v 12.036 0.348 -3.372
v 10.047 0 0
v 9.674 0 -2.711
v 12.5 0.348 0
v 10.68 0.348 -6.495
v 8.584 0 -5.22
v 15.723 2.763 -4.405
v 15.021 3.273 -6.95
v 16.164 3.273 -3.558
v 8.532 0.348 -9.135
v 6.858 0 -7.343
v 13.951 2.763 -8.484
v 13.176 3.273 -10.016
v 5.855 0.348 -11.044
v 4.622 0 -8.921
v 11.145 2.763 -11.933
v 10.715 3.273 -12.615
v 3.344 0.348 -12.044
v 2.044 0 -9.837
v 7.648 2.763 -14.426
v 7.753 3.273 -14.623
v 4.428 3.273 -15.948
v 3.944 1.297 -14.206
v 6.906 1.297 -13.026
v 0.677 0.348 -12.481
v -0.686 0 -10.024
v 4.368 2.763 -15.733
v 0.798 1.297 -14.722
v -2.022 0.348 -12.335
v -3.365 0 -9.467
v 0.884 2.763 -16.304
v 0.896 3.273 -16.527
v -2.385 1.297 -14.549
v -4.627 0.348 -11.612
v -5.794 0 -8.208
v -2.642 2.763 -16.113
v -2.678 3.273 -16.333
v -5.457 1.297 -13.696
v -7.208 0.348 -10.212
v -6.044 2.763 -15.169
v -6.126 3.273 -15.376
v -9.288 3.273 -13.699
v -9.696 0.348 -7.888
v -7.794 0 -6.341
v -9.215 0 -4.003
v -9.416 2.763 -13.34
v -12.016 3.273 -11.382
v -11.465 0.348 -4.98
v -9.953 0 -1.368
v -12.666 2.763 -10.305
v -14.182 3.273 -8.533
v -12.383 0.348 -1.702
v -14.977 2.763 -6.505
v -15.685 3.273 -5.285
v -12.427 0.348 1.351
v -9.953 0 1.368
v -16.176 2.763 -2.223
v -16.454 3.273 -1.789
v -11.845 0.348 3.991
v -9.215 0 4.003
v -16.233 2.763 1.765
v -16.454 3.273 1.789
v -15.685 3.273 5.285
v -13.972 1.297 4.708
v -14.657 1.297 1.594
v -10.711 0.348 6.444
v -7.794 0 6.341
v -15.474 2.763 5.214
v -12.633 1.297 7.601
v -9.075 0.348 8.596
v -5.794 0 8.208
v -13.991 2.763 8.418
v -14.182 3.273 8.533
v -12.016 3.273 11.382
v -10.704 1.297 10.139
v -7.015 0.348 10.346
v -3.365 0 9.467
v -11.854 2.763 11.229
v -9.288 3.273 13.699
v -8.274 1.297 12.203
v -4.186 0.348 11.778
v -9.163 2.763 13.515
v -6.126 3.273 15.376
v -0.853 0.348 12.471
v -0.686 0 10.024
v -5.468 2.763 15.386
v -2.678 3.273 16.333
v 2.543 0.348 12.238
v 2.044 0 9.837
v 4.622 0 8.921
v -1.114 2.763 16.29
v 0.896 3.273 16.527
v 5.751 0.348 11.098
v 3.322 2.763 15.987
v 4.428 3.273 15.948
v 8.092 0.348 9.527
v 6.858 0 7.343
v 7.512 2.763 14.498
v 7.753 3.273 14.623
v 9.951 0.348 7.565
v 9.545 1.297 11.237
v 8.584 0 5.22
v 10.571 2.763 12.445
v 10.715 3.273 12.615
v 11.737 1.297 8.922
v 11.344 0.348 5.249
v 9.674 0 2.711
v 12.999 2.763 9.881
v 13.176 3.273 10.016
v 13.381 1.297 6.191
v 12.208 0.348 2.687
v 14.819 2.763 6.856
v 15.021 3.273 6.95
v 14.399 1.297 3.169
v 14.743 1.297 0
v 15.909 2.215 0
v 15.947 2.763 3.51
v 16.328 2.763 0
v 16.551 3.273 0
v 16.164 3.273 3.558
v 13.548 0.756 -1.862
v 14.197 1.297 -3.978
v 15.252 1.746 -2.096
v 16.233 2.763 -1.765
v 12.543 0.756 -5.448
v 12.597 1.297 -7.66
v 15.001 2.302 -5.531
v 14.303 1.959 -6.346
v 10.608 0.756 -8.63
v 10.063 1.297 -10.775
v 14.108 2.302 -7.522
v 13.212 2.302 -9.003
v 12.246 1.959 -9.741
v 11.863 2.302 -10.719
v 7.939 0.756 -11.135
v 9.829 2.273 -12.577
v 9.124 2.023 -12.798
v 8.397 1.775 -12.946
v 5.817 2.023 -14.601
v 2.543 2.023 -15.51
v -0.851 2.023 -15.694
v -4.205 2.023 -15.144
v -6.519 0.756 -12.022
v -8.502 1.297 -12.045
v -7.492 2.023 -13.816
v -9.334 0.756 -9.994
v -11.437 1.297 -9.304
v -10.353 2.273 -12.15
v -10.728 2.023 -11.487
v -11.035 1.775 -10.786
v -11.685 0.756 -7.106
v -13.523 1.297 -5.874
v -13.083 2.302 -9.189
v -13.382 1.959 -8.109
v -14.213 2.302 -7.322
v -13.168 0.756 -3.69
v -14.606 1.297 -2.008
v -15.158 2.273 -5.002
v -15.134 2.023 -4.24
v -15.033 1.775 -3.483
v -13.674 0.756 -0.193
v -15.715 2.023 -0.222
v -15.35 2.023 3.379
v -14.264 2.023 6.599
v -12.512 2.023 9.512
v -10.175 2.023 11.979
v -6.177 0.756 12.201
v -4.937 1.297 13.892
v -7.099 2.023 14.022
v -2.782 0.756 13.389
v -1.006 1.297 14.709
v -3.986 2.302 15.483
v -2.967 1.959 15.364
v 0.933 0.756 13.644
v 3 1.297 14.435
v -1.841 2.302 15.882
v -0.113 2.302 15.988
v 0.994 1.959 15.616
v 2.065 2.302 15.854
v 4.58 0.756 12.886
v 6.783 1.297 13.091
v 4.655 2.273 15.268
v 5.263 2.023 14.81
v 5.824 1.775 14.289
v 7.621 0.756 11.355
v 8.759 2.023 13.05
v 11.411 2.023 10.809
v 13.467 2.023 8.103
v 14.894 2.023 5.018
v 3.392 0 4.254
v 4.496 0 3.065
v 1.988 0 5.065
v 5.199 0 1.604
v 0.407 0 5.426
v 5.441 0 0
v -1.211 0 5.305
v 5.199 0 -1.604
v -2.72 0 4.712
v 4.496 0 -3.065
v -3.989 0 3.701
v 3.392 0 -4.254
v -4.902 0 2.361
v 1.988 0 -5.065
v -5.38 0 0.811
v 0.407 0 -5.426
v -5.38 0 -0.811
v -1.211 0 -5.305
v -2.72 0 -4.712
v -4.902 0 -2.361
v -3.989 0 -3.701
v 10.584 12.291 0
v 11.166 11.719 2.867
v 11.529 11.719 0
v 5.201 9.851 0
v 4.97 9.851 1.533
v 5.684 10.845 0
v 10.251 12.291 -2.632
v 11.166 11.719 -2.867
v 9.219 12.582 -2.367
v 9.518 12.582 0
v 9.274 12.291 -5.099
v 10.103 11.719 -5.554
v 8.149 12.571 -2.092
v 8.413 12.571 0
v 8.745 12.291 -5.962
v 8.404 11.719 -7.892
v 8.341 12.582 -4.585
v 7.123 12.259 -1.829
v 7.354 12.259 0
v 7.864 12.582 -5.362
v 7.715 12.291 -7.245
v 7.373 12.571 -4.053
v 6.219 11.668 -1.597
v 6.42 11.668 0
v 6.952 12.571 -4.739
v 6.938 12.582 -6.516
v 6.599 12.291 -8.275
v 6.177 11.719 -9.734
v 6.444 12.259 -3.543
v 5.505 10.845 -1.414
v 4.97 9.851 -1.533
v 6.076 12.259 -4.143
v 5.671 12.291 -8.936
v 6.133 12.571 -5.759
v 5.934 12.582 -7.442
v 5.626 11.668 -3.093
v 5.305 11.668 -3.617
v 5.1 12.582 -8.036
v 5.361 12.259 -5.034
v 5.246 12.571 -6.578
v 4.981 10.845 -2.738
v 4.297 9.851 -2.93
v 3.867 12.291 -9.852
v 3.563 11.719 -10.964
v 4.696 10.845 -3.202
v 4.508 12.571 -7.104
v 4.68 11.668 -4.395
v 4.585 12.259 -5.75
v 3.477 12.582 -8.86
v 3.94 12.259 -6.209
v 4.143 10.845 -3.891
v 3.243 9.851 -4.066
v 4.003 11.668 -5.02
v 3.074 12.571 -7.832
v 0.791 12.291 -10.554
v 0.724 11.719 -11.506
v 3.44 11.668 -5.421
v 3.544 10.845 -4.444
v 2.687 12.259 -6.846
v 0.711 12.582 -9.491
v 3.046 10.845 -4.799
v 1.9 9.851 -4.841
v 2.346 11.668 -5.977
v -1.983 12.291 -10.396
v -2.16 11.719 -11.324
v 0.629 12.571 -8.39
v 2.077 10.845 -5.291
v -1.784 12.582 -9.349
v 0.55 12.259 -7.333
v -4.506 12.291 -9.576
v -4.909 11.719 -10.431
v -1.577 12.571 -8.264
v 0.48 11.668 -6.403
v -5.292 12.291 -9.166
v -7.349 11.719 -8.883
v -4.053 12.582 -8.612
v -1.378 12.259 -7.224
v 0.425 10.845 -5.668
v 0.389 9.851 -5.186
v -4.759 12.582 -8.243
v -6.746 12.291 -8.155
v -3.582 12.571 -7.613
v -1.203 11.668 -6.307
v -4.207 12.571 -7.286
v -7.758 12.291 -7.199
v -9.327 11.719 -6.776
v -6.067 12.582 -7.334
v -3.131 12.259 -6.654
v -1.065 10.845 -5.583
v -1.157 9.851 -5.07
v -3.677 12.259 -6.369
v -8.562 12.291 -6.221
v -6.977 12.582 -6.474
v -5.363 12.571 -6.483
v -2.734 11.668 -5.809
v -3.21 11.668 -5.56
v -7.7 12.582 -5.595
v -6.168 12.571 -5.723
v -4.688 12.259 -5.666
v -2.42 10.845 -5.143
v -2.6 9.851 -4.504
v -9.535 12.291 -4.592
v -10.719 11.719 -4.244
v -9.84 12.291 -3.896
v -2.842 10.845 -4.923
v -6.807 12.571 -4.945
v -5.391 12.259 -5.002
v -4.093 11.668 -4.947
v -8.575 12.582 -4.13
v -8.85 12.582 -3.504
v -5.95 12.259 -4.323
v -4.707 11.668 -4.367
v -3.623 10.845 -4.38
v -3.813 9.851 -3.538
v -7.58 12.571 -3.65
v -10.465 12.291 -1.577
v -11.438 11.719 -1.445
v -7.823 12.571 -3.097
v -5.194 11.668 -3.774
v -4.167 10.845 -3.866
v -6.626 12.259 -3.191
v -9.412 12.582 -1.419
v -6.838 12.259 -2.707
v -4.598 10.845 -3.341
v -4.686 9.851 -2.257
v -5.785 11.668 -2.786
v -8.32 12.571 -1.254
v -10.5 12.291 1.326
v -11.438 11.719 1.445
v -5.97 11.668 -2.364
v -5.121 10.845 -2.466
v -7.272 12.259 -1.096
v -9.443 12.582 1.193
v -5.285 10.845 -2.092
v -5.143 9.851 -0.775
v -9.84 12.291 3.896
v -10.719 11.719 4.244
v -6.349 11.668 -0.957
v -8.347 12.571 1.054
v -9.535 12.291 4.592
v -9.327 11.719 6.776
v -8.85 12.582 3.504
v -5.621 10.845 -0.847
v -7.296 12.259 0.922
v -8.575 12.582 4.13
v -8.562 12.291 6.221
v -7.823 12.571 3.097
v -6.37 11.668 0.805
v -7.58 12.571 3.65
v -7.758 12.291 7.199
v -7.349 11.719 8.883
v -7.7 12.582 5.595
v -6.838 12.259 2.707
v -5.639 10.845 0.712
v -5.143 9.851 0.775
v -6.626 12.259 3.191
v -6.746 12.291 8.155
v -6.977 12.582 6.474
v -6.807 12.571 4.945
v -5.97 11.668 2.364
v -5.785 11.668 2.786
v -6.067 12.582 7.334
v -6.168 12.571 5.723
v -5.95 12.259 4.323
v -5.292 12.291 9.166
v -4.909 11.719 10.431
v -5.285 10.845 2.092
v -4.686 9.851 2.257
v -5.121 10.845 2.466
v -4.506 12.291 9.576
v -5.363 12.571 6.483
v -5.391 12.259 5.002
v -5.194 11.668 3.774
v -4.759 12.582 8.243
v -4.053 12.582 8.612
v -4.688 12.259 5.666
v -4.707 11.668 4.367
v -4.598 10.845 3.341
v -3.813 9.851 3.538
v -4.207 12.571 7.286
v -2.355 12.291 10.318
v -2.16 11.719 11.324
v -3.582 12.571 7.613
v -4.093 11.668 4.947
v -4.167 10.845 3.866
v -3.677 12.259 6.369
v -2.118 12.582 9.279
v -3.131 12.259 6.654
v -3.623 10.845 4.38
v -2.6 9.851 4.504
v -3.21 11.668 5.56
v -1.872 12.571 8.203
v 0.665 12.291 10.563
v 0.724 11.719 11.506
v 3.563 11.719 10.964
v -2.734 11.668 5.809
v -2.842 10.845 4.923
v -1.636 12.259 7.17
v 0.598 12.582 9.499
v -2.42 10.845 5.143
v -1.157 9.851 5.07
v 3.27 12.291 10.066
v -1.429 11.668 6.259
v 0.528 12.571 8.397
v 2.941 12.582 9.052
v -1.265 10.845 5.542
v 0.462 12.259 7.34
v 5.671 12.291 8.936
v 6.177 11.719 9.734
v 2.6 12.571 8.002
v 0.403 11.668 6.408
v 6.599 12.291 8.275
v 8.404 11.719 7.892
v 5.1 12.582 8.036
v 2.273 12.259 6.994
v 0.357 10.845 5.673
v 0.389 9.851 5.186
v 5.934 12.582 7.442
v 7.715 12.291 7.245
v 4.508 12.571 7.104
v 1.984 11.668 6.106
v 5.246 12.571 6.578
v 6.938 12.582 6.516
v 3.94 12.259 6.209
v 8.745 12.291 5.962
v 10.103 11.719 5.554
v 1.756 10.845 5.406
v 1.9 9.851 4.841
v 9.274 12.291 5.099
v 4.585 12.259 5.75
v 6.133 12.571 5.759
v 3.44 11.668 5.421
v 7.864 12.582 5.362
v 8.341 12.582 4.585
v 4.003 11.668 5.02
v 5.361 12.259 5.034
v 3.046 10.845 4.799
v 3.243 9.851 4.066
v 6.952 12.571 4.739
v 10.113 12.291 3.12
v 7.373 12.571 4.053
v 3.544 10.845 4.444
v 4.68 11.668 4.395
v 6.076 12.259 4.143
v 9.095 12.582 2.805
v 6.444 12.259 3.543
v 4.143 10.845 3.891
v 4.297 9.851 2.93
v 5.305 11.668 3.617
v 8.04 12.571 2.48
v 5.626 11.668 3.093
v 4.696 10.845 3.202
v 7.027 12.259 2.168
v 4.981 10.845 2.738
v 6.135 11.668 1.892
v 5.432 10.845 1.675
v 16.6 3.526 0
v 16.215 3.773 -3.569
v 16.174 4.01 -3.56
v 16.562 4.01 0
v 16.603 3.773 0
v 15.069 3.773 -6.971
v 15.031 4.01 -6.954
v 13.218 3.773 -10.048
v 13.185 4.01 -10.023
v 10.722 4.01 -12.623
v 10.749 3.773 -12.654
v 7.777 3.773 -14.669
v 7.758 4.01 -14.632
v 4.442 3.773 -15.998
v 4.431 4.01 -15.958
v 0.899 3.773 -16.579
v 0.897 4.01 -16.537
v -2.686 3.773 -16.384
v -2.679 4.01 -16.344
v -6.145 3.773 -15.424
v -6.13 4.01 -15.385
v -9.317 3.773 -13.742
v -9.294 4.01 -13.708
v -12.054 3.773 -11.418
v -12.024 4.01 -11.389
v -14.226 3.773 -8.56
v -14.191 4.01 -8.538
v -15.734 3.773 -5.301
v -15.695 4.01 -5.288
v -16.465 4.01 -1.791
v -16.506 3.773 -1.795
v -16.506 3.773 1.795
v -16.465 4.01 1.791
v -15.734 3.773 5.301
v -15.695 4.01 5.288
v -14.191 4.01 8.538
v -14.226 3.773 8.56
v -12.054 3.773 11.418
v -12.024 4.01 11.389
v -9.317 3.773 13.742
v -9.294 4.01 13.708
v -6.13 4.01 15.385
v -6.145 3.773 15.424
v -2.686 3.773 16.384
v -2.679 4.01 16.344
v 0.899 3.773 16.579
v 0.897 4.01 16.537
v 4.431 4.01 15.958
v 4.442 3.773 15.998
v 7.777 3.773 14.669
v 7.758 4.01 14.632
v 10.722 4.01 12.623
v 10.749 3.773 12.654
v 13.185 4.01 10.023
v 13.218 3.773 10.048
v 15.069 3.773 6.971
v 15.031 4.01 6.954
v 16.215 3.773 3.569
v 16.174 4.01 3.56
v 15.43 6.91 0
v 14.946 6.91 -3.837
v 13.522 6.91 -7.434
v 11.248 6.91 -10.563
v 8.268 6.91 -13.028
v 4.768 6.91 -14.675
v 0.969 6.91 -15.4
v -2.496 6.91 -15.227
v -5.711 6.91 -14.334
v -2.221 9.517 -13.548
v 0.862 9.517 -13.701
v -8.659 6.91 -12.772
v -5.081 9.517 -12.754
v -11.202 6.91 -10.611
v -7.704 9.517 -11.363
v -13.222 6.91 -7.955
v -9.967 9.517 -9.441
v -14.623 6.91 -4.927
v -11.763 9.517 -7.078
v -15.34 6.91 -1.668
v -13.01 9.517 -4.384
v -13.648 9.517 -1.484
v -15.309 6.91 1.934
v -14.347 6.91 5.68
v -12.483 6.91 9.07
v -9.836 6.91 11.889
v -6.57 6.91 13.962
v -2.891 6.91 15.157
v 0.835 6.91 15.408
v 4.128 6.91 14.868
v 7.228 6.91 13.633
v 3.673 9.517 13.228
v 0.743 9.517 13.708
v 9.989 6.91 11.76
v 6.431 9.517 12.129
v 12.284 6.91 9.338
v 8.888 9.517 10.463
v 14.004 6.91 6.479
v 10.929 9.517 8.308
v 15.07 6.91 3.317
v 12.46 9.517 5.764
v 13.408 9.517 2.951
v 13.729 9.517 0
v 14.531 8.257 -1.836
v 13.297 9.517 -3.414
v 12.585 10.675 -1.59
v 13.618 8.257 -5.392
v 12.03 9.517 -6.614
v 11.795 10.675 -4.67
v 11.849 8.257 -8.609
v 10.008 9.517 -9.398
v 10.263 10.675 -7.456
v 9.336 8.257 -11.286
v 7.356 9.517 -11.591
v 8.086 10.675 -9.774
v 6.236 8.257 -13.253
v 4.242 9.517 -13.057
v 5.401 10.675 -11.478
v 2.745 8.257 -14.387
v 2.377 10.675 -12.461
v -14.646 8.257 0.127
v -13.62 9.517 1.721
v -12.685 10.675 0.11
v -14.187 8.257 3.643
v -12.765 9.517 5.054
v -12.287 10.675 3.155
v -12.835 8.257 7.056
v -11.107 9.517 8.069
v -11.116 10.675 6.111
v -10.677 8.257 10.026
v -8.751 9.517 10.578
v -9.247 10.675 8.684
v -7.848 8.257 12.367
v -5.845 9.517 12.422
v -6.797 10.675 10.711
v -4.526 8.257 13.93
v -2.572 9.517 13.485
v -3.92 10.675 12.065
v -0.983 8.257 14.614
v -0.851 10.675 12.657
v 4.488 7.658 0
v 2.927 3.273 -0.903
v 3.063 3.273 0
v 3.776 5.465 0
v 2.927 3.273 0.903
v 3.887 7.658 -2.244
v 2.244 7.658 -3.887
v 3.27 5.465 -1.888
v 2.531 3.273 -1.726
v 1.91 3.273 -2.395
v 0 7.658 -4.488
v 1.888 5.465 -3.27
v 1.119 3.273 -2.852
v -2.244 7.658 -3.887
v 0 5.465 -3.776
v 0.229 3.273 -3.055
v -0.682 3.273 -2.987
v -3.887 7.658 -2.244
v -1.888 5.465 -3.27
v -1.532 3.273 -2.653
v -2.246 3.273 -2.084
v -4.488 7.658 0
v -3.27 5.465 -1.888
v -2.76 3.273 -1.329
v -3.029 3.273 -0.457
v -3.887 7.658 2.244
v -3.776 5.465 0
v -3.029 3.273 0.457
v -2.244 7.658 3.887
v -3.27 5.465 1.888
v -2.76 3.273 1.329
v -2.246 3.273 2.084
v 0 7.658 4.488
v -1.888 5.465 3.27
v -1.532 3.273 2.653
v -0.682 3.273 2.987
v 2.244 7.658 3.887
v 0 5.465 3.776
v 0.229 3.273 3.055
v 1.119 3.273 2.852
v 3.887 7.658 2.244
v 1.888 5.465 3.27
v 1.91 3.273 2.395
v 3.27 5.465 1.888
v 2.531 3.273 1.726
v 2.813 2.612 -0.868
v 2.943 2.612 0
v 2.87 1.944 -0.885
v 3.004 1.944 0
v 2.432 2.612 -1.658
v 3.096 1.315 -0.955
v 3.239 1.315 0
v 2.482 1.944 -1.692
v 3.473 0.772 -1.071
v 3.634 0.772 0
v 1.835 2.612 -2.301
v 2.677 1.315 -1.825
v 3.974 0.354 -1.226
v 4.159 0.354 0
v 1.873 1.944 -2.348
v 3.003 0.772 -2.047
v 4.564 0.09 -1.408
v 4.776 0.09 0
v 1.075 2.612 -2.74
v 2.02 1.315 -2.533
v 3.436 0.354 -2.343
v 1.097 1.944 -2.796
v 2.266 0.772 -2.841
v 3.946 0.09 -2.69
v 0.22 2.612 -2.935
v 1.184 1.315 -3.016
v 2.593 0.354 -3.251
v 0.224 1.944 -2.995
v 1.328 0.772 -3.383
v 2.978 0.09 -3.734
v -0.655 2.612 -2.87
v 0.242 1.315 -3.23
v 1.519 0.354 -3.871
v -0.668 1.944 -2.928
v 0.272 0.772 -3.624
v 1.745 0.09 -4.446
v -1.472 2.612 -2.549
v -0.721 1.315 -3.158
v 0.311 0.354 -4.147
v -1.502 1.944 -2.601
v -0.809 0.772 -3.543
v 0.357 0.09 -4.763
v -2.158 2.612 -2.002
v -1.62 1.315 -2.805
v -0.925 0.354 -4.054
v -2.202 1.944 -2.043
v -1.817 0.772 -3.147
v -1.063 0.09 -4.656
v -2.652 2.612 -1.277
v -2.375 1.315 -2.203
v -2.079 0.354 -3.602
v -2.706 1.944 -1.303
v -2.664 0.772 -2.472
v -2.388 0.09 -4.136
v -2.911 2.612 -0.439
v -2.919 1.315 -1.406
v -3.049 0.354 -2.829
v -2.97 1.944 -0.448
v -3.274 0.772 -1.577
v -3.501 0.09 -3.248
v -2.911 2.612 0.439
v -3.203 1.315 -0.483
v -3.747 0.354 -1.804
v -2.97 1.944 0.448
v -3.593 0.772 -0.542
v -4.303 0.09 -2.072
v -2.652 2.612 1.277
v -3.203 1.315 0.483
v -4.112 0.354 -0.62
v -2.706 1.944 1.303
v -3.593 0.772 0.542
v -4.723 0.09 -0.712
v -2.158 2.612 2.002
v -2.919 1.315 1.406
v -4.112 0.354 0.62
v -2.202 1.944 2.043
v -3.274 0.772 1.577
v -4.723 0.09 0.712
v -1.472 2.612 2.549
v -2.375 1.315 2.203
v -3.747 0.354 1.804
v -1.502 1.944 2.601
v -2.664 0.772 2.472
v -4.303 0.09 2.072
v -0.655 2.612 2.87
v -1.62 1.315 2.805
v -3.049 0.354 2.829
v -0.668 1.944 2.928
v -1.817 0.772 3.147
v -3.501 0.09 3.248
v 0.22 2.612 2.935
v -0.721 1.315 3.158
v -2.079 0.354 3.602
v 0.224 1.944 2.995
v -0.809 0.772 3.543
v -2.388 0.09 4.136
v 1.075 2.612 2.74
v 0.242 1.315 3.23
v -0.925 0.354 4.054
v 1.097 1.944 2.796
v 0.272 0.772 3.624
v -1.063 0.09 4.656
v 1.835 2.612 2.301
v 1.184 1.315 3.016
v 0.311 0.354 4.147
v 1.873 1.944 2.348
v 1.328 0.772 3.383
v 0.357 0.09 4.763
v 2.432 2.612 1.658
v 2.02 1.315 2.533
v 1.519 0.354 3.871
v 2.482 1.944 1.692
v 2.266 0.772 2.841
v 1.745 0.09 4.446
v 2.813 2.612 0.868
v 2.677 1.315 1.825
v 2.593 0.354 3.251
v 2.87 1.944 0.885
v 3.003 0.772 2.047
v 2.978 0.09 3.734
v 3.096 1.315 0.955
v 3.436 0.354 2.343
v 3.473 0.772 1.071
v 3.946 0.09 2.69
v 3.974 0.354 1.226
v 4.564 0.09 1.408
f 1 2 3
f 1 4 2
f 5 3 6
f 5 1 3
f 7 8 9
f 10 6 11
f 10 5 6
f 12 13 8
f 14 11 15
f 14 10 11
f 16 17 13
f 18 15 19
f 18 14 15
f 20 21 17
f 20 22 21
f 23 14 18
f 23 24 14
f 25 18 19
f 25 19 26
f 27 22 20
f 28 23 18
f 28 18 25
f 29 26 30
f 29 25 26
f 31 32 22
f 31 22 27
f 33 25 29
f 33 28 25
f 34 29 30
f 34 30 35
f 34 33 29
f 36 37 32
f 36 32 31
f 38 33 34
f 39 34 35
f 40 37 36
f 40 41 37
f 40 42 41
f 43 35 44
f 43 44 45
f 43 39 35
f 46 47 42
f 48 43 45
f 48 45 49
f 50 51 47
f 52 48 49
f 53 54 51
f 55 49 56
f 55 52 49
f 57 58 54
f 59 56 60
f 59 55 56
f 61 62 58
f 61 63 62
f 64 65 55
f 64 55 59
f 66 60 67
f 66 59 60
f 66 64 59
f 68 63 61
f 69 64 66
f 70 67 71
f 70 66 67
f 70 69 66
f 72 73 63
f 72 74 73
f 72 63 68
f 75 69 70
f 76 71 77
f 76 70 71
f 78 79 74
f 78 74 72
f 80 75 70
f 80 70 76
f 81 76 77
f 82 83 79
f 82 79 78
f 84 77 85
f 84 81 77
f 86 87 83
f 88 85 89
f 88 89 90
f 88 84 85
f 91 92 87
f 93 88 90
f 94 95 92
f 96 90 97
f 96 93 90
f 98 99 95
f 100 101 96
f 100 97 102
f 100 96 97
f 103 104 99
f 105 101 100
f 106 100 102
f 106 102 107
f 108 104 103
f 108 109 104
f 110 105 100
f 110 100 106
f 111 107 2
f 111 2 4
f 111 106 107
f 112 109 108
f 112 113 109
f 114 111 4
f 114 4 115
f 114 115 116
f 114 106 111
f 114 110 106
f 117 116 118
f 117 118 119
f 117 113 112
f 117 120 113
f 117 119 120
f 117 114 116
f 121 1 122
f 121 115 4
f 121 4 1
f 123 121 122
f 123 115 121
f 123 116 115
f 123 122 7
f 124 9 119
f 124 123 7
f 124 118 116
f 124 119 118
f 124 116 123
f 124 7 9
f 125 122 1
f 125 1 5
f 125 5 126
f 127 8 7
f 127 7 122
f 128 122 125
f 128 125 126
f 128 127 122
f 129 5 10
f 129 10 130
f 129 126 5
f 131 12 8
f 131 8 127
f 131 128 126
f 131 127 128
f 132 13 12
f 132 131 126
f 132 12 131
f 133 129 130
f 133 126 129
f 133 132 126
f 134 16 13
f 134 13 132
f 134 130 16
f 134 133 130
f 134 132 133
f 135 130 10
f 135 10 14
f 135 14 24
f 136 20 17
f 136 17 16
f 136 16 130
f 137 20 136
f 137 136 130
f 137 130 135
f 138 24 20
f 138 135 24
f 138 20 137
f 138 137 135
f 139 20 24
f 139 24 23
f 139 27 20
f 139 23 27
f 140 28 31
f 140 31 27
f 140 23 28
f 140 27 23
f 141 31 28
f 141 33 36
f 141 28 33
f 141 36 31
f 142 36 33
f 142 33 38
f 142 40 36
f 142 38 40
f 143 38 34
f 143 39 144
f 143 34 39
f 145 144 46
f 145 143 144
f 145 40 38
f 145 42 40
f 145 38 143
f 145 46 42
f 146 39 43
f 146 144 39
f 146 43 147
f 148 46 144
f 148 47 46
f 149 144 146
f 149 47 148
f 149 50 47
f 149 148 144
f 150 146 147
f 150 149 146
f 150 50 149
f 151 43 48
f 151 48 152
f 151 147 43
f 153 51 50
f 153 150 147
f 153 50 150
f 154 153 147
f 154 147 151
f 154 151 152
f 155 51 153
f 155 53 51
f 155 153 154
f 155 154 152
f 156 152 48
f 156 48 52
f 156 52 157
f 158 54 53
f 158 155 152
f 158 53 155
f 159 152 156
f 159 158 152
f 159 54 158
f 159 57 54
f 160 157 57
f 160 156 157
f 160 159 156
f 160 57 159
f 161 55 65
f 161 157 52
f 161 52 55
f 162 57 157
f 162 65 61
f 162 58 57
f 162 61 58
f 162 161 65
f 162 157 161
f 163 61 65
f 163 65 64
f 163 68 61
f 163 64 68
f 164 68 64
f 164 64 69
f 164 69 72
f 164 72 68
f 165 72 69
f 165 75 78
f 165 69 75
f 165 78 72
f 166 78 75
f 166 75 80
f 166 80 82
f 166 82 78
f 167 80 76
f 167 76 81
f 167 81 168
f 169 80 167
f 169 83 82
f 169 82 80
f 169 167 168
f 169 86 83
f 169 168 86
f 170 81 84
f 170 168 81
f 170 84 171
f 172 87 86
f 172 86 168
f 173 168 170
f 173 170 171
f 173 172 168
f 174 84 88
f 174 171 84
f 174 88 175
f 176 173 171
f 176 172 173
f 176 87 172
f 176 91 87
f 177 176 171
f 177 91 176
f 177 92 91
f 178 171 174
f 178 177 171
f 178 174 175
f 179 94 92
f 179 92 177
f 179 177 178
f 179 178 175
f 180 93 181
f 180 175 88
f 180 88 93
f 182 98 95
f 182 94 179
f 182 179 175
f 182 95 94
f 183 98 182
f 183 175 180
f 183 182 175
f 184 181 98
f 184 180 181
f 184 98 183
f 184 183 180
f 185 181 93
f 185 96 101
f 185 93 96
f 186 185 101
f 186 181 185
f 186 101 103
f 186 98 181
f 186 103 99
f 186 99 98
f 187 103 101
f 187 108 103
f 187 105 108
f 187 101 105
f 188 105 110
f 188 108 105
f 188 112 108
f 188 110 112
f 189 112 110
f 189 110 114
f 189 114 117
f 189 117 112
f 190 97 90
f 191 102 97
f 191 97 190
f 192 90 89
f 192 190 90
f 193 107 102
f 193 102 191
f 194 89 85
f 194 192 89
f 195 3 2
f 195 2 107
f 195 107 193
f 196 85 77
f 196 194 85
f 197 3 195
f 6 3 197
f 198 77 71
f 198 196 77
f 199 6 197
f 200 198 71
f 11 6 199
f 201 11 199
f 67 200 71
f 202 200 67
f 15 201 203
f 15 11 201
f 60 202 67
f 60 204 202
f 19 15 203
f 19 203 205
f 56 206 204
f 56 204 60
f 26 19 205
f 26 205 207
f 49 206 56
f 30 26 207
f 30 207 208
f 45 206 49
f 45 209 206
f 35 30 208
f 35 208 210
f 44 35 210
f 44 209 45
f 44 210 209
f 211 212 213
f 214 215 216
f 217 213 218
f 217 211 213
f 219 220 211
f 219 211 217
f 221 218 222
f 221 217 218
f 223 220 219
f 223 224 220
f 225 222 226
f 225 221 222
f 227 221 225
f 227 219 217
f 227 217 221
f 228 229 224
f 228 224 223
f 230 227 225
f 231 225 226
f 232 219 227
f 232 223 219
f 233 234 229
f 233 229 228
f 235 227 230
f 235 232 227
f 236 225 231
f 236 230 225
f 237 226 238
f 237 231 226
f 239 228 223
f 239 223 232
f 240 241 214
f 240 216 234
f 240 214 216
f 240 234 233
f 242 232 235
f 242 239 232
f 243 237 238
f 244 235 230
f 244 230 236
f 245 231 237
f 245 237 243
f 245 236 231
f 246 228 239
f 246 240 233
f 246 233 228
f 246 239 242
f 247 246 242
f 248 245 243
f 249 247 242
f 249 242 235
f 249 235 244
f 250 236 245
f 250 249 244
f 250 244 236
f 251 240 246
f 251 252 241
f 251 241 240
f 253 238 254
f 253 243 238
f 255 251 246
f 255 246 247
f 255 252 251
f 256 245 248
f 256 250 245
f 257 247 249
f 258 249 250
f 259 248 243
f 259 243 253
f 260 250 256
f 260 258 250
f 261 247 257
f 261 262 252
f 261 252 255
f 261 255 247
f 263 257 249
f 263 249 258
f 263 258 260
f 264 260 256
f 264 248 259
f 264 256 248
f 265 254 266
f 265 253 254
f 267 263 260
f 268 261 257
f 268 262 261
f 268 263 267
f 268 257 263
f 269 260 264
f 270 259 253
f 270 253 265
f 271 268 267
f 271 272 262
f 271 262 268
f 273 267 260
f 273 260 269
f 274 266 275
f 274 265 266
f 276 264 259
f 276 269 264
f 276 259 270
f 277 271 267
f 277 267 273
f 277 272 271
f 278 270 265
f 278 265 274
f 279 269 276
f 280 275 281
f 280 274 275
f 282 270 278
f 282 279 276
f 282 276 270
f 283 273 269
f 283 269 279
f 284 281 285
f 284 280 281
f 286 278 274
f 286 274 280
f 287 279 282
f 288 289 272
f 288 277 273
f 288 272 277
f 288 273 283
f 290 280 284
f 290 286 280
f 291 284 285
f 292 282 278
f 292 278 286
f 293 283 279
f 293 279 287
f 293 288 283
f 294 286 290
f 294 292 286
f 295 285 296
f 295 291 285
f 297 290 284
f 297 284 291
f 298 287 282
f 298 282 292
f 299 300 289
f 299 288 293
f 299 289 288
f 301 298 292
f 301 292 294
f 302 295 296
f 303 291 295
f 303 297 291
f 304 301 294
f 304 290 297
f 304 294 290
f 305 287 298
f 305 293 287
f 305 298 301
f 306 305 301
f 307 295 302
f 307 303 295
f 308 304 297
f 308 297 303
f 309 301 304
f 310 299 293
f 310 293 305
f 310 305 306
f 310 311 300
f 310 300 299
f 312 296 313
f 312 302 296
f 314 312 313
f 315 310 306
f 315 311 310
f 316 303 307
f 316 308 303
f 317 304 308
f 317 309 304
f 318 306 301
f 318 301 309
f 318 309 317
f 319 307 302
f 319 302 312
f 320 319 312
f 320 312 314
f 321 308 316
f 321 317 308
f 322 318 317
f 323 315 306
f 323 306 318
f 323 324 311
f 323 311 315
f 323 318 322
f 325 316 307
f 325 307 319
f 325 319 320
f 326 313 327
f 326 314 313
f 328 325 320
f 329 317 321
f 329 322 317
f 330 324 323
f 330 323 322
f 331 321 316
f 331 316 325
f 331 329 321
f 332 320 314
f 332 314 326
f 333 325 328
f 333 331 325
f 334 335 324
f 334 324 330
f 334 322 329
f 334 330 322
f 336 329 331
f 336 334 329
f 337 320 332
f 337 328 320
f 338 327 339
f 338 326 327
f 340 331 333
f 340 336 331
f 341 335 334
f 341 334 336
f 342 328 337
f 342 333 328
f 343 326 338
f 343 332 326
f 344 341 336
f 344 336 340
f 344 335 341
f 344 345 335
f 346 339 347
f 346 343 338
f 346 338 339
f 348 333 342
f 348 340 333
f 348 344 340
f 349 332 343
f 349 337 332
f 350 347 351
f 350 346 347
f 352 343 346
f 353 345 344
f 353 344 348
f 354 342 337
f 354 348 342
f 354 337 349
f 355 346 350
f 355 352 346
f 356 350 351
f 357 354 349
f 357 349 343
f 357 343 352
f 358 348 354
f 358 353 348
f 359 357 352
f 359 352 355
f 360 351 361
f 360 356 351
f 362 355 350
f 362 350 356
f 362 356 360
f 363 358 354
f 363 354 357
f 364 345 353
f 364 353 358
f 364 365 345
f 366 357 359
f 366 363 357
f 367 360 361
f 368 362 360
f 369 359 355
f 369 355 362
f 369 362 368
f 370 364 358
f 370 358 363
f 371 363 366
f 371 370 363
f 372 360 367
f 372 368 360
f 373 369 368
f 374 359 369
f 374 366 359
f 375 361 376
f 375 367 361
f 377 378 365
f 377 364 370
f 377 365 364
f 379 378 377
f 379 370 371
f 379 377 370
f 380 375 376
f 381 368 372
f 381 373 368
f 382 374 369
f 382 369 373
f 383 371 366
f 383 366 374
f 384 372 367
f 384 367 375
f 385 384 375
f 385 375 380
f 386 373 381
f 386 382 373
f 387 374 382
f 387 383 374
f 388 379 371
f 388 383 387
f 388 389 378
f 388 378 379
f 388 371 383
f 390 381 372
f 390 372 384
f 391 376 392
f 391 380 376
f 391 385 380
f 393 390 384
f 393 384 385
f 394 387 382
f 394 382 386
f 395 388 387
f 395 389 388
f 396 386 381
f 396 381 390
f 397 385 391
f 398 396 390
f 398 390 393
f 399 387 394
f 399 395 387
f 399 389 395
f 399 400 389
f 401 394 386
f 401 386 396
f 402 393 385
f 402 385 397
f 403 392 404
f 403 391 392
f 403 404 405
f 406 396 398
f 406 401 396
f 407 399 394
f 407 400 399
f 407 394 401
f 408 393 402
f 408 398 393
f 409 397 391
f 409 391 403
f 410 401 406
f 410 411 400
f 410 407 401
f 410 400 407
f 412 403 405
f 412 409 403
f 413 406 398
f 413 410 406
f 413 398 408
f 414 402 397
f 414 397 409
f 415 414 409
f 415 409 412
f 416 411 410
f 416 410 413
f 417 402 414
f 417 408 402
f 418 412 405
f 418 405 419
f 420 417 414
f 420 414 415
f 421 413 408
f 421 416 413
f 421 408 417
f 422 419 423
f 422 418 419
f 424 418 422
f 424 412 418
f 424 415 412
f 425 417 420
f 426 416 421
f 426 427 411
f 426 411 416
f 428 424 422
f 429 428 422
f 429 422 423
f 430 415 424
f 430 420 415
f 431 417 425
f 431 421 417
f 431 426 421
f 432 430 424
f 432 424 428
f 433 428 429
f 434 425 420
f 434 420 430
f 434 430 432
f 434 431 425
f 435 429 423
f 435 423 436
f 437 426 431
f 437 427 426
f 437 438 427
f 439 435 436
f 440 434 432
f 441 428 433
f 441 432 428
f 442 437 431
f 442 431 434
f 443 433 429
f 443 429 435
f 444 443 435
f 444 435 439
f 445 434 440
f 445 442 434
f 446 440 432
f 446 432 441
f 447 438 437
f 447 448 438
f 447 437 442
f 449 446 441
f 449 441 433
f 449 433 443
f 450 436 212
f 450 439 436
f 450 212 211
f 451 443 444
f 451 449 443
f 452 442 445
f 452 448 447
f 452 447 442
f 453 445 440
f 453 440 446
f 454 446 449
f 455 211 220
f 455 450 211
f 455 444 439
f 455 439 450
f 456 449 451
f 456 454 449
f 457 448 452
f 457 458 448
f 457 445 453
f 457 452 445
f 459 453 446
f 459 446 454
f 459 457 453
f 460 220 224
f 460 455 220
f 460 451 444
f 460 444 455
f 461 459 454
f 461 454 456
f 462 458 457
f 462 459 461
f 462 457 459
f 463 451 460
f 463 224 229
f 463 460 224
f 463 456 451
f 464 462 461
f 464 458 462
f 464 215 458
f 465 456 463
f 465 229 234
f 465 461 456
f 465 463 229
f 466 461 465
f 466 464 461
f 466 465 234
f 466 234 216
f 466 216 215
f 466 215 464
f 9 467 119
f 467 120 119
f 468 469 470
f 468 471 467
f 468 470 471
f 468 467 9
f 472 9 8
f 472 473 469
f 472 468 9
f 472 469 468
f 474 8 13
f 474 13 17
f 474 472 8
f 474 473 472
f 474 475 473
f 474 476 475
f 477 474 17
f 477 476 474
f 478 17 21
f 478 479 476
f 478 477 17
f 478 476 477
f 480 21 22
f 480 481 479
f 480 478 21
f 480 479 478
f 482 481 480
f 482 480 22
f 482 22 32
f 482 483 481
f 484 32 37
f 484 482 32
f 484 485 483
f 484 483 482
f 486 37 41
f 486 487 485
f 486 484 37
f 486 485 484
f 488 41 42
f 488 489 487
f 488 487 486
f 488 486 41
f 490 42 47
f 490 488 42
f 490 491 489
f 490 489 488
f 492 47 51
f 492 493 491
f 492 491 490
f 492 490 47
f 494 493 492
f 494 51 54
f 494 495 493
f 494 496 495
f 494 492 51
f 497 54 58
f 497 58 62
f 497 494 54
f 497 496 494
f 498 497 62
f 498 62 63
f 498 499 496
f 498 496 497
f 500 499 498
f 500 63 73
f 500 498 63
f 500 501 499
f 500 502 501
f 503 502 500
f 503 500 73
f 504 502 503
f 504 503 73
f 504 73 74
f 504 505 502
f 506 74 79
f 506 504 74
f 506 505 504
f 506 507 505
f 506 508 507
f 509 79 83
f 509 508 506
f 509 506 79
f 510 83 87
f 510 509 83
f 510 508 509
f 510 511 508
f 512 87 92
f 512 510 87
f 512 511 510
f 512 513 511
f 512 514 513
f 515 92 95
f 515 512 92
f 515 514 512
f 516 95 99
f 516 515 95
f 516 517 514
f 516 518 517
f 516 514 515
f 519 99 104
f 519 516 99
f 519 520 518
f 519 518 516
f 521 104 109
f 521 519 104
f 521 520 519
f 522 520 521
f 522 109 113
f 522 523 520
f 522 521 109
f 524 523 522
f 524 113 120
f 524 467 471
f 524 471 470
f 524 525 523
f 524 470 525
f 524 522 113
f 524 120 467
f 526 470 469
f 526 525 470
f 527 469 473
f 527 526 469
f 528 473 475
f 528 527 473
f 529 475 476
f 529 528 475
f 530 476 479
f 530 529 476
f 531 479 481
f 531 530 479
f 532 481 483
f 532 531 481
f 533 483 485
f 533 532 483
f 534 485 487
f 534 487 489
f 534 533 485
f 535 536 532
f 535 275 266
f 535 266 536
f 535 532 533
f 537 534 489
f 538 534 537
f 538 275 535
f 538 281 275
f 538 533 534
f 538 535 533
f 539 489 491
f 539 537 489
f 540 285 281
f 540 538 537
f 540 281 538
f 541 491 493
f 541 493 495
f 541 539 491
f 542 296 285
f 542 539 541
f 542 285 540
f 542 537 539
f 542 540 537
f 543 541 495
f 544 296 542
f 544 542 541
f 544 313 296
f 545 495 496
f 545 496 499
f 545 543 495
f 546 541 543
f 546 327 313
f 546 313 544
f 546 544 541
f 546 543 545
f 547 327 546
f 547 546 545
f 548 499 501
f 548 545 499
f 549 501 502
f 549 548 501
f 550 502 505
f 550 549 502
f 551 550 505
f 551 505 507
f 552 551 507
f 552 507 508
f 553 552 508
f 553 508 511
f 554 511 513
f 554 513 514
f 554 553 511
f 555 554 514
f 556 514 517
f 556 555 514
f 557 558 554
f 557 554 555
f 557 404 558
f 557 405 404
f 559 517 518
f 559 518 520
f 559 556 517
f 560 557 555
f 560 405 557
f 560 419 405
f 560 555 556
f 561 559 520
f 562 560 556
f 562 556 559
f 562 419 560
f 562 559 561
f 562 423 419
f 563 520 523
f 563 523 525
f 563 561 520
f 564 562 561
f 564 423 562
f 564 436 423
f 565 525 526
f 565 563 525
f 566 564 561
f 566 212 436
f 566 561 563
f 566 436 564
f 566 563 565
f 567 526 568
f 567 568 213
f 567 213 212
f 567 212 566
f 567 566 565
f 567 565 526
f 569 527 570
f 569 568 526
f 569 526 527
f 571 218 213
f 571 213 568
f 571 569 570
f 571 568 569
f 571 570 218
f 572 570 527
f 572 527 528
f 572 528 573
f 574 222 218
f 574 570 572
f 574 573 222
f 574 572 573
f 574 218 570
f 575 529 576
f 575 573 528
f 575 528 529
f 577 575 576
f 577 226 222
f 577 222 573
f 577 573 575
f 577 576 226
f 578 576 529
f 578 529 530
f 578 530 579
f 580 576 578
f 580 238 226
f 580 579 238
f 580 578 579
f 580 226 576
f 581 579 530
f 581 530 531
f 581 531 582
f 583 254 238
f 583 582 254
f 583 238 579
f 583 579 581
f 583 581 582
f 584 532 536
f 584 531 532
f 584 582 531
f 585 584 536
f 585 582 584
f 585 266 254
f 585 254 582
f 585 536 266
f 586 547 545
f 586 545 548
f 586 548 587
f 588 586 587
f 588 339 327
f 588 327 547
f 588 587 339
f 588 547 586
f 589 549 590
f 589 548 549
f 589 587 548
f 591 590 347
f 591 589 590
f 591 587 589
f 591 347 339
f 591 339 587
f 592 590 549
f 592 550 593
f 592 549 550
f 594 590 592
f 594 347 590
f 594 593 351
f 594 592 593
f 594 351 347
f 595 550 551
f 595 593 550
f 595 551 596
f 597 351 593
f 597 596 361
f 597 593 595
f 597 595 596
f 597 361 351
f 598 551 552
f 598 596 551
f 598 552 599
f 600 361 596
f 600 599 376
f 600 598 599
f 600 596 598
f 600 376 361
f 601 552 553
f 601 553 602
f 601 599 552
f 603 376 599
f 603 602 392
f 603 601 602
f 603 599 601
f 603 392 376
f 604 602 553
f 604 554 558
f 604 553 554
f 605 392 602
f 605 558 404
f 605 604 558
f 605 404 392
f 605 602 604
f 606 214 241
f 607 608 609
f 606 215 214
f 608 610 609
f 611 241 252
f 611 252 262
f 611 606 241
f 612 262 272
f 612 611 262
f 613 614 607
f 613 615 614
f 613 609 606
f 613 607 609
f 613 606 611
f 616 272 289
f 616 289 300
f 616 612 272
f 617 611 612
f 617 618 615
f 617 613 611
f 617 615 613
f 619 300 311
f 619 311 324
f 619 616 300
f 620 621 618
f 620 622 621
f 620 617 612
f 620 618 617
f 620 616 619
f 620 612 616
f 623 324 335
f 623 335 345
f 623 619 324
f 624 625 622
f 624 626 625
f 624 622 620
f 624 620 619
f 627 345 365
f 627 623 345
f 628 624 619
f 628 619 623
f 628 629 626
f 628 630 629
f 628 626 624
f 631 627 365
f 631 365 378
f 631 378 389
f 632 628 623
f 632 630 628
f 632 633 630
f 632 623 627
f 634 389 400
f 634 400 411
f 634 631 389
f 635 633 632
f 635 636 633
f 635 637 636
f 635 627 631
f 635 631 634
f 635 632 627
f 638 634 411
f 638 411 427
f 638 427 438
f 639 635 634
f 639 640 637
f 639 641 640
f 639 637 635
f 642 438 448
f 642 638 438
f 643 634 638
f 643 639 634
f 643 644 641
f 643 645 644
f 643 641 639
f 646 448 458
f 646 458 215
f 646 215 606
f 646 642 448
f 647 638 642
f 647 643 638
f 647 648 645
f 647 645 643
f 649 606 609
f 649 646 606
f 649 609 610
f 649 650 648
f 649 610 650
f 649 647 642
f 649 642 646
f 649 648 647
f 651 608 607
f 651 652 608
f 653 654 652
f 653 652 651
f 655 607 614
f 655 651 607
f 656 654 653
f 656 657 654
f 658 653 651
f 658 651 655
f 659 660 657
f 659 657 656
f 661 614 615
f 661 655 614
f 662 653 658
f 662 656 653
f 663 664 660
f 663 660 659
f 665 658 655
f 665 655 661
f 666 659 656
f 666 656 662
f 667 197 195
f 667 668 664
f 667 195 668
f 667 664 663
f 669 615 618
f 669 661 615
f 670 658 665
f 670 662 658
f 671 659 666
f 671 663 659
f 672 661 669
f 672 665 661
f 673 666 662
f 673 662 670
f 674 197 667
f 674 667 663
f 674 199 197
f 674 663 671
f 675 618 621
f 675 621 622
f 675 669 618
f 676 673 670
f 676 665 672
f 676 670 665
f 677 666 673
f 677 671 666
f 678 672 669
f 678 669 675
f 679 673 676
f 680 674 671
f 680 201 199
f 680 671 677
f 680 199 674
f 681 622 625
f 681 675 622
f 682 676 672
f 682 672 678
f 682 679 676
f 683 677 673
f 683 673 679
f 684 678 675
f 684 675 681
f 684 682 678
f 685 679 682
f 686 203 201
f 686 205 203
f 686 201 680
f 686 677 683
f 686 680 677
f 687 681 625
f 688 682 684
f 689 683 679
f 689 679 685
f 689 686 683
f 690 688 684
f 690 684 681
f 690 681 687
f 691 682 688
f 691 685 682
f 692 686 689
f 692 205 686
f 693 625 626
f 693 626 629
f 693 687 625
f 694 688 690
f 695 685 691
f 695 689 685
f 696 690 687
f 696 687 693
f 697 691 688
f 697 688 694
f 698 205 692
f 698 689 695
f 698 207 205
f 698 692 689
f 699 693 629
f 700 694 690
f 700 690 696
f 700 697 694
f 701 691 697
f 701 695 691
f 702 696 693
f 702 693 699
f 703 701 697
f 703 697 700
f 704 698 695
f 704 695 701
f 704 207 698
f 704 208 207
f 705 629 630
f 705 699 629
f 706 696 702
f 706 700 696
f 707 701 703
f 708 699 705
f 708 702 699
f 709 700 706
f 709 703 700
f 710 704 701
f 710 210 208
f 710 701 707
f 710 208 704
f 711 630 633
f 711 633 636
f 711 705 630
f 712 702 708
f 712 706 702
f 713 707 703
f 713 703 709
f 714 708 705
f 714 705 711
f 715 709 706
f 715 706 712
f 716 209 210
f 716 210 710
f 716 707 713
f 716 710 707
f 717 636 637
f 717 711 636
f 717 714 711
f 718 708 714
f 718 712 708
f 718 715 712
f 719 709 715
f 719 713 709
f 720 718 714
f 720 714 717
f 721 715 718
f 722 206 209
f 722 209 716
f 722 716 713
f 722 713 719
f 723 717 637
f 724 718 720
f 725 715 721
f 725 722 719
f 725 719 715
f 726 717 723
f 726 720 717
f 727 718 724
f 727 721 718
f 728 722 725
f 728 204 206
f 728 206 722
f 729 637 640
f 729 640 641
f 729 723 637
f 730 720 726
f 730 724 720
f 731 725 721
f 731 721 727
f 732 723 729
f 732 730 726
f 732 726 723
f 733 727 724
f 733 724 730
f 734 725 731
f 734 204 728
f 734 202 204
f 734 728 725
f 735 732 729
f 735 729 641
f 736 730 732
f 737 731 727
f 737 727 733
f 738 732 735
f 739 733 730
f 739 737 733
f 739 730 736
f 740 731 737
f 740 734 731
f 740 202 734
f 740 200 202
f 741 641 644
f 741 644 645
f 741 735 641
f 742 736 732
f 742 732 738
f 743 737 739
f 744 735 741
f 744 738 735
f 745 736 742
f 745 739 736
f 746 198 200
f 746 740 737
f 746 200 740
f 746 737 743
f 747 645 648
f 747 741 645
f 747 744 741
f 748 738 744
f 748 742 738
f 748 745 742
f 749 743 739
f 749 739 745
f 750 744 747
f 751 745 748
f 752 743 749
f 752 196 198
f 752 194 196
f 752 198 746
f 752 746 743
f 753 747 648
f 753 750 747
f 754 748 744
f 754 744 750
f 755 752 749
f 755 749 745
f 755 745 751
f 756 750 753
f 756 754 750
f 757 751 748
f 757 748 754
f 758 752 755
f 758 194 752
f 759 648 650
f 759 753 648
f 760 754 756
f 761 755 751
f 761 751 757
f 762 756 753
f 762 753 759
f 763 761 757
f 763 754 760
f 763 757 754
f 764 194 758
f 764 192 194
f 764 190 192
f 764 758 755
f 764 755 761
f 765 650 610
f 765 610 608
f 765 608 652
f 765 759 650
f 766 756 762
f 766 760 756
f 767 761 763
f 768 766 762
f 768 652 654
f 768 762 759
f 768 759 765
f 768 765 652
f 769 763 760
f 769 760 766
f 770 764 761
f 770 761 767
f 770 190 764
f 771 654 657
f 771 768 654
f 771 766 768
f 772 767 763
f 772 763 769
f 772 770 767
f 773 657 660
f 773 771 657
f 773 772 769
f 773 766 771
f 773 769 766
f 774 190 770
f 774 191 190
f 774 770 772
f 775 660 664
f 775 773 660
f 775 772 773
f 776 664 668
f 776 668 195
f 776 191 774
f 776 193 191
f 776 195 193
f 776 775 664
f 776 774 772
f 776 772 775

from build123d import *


with BuildPart() as f1:
    # F0 (on Top) → F1 (revolve)
    with BuildSketch(Plane.XY):
        with BuildLine():
            ThreePointArc((3.0633135104, 3.2725424859), (3.4184123152, 1.0305368693), (5.4409548012, 0))
            Line((5.4409548012, 0), (10.047032676, 0))
            add(Edge.make_bspline(
                [(10.047032676, 0), (15.6495332881, 0), (16.551087103, 3.2725424859)],
                knots=[4.2304507978, 4.2304507978, 4.2304507978, 6.0015152151, 6.0015152151, 6.0015152151], degree=2, weights=[1, 0.6328775276, 1]))
            Line((16.551087103, 3.2725424859), (3.0633135104, 3.2725424859))
        make_face()
        with BuildLine():
            Line((5.2008972323, 9.8513487161), (3.0633135104, 3.2725424859))
            Line((3.0633135104, 3.2725424859), (16.551087103, 3.2725424859))
            add(Edge.make_bspline(
                [(16.551087103, 3.2725424859), (16.6579962544, 3.6606111005), (16.5616925878, 4.0102970167)],
                knots=[6.0015152151, 6.0015152151, 6.0015152151, 6.2896505601, 6.2896505601, 6.2896505601], degree=2, weights=[1, 0.9896401901, 1]))
            ThreePointArc((16.5616925878, 4.0102970167), (14.6467845529, 8.2573732905), (11.5286236462, 11.7188183959))
            ThreePointArc((11.5286236462, 11.7188183959), (7.8729018786, 12.4516950356), (5.2008972323, 9.8513487161))
        make_face()
    revolve(axis=Axis((0, 3.47598386, 0), (0, 1, 0)))


solid = f1.part
